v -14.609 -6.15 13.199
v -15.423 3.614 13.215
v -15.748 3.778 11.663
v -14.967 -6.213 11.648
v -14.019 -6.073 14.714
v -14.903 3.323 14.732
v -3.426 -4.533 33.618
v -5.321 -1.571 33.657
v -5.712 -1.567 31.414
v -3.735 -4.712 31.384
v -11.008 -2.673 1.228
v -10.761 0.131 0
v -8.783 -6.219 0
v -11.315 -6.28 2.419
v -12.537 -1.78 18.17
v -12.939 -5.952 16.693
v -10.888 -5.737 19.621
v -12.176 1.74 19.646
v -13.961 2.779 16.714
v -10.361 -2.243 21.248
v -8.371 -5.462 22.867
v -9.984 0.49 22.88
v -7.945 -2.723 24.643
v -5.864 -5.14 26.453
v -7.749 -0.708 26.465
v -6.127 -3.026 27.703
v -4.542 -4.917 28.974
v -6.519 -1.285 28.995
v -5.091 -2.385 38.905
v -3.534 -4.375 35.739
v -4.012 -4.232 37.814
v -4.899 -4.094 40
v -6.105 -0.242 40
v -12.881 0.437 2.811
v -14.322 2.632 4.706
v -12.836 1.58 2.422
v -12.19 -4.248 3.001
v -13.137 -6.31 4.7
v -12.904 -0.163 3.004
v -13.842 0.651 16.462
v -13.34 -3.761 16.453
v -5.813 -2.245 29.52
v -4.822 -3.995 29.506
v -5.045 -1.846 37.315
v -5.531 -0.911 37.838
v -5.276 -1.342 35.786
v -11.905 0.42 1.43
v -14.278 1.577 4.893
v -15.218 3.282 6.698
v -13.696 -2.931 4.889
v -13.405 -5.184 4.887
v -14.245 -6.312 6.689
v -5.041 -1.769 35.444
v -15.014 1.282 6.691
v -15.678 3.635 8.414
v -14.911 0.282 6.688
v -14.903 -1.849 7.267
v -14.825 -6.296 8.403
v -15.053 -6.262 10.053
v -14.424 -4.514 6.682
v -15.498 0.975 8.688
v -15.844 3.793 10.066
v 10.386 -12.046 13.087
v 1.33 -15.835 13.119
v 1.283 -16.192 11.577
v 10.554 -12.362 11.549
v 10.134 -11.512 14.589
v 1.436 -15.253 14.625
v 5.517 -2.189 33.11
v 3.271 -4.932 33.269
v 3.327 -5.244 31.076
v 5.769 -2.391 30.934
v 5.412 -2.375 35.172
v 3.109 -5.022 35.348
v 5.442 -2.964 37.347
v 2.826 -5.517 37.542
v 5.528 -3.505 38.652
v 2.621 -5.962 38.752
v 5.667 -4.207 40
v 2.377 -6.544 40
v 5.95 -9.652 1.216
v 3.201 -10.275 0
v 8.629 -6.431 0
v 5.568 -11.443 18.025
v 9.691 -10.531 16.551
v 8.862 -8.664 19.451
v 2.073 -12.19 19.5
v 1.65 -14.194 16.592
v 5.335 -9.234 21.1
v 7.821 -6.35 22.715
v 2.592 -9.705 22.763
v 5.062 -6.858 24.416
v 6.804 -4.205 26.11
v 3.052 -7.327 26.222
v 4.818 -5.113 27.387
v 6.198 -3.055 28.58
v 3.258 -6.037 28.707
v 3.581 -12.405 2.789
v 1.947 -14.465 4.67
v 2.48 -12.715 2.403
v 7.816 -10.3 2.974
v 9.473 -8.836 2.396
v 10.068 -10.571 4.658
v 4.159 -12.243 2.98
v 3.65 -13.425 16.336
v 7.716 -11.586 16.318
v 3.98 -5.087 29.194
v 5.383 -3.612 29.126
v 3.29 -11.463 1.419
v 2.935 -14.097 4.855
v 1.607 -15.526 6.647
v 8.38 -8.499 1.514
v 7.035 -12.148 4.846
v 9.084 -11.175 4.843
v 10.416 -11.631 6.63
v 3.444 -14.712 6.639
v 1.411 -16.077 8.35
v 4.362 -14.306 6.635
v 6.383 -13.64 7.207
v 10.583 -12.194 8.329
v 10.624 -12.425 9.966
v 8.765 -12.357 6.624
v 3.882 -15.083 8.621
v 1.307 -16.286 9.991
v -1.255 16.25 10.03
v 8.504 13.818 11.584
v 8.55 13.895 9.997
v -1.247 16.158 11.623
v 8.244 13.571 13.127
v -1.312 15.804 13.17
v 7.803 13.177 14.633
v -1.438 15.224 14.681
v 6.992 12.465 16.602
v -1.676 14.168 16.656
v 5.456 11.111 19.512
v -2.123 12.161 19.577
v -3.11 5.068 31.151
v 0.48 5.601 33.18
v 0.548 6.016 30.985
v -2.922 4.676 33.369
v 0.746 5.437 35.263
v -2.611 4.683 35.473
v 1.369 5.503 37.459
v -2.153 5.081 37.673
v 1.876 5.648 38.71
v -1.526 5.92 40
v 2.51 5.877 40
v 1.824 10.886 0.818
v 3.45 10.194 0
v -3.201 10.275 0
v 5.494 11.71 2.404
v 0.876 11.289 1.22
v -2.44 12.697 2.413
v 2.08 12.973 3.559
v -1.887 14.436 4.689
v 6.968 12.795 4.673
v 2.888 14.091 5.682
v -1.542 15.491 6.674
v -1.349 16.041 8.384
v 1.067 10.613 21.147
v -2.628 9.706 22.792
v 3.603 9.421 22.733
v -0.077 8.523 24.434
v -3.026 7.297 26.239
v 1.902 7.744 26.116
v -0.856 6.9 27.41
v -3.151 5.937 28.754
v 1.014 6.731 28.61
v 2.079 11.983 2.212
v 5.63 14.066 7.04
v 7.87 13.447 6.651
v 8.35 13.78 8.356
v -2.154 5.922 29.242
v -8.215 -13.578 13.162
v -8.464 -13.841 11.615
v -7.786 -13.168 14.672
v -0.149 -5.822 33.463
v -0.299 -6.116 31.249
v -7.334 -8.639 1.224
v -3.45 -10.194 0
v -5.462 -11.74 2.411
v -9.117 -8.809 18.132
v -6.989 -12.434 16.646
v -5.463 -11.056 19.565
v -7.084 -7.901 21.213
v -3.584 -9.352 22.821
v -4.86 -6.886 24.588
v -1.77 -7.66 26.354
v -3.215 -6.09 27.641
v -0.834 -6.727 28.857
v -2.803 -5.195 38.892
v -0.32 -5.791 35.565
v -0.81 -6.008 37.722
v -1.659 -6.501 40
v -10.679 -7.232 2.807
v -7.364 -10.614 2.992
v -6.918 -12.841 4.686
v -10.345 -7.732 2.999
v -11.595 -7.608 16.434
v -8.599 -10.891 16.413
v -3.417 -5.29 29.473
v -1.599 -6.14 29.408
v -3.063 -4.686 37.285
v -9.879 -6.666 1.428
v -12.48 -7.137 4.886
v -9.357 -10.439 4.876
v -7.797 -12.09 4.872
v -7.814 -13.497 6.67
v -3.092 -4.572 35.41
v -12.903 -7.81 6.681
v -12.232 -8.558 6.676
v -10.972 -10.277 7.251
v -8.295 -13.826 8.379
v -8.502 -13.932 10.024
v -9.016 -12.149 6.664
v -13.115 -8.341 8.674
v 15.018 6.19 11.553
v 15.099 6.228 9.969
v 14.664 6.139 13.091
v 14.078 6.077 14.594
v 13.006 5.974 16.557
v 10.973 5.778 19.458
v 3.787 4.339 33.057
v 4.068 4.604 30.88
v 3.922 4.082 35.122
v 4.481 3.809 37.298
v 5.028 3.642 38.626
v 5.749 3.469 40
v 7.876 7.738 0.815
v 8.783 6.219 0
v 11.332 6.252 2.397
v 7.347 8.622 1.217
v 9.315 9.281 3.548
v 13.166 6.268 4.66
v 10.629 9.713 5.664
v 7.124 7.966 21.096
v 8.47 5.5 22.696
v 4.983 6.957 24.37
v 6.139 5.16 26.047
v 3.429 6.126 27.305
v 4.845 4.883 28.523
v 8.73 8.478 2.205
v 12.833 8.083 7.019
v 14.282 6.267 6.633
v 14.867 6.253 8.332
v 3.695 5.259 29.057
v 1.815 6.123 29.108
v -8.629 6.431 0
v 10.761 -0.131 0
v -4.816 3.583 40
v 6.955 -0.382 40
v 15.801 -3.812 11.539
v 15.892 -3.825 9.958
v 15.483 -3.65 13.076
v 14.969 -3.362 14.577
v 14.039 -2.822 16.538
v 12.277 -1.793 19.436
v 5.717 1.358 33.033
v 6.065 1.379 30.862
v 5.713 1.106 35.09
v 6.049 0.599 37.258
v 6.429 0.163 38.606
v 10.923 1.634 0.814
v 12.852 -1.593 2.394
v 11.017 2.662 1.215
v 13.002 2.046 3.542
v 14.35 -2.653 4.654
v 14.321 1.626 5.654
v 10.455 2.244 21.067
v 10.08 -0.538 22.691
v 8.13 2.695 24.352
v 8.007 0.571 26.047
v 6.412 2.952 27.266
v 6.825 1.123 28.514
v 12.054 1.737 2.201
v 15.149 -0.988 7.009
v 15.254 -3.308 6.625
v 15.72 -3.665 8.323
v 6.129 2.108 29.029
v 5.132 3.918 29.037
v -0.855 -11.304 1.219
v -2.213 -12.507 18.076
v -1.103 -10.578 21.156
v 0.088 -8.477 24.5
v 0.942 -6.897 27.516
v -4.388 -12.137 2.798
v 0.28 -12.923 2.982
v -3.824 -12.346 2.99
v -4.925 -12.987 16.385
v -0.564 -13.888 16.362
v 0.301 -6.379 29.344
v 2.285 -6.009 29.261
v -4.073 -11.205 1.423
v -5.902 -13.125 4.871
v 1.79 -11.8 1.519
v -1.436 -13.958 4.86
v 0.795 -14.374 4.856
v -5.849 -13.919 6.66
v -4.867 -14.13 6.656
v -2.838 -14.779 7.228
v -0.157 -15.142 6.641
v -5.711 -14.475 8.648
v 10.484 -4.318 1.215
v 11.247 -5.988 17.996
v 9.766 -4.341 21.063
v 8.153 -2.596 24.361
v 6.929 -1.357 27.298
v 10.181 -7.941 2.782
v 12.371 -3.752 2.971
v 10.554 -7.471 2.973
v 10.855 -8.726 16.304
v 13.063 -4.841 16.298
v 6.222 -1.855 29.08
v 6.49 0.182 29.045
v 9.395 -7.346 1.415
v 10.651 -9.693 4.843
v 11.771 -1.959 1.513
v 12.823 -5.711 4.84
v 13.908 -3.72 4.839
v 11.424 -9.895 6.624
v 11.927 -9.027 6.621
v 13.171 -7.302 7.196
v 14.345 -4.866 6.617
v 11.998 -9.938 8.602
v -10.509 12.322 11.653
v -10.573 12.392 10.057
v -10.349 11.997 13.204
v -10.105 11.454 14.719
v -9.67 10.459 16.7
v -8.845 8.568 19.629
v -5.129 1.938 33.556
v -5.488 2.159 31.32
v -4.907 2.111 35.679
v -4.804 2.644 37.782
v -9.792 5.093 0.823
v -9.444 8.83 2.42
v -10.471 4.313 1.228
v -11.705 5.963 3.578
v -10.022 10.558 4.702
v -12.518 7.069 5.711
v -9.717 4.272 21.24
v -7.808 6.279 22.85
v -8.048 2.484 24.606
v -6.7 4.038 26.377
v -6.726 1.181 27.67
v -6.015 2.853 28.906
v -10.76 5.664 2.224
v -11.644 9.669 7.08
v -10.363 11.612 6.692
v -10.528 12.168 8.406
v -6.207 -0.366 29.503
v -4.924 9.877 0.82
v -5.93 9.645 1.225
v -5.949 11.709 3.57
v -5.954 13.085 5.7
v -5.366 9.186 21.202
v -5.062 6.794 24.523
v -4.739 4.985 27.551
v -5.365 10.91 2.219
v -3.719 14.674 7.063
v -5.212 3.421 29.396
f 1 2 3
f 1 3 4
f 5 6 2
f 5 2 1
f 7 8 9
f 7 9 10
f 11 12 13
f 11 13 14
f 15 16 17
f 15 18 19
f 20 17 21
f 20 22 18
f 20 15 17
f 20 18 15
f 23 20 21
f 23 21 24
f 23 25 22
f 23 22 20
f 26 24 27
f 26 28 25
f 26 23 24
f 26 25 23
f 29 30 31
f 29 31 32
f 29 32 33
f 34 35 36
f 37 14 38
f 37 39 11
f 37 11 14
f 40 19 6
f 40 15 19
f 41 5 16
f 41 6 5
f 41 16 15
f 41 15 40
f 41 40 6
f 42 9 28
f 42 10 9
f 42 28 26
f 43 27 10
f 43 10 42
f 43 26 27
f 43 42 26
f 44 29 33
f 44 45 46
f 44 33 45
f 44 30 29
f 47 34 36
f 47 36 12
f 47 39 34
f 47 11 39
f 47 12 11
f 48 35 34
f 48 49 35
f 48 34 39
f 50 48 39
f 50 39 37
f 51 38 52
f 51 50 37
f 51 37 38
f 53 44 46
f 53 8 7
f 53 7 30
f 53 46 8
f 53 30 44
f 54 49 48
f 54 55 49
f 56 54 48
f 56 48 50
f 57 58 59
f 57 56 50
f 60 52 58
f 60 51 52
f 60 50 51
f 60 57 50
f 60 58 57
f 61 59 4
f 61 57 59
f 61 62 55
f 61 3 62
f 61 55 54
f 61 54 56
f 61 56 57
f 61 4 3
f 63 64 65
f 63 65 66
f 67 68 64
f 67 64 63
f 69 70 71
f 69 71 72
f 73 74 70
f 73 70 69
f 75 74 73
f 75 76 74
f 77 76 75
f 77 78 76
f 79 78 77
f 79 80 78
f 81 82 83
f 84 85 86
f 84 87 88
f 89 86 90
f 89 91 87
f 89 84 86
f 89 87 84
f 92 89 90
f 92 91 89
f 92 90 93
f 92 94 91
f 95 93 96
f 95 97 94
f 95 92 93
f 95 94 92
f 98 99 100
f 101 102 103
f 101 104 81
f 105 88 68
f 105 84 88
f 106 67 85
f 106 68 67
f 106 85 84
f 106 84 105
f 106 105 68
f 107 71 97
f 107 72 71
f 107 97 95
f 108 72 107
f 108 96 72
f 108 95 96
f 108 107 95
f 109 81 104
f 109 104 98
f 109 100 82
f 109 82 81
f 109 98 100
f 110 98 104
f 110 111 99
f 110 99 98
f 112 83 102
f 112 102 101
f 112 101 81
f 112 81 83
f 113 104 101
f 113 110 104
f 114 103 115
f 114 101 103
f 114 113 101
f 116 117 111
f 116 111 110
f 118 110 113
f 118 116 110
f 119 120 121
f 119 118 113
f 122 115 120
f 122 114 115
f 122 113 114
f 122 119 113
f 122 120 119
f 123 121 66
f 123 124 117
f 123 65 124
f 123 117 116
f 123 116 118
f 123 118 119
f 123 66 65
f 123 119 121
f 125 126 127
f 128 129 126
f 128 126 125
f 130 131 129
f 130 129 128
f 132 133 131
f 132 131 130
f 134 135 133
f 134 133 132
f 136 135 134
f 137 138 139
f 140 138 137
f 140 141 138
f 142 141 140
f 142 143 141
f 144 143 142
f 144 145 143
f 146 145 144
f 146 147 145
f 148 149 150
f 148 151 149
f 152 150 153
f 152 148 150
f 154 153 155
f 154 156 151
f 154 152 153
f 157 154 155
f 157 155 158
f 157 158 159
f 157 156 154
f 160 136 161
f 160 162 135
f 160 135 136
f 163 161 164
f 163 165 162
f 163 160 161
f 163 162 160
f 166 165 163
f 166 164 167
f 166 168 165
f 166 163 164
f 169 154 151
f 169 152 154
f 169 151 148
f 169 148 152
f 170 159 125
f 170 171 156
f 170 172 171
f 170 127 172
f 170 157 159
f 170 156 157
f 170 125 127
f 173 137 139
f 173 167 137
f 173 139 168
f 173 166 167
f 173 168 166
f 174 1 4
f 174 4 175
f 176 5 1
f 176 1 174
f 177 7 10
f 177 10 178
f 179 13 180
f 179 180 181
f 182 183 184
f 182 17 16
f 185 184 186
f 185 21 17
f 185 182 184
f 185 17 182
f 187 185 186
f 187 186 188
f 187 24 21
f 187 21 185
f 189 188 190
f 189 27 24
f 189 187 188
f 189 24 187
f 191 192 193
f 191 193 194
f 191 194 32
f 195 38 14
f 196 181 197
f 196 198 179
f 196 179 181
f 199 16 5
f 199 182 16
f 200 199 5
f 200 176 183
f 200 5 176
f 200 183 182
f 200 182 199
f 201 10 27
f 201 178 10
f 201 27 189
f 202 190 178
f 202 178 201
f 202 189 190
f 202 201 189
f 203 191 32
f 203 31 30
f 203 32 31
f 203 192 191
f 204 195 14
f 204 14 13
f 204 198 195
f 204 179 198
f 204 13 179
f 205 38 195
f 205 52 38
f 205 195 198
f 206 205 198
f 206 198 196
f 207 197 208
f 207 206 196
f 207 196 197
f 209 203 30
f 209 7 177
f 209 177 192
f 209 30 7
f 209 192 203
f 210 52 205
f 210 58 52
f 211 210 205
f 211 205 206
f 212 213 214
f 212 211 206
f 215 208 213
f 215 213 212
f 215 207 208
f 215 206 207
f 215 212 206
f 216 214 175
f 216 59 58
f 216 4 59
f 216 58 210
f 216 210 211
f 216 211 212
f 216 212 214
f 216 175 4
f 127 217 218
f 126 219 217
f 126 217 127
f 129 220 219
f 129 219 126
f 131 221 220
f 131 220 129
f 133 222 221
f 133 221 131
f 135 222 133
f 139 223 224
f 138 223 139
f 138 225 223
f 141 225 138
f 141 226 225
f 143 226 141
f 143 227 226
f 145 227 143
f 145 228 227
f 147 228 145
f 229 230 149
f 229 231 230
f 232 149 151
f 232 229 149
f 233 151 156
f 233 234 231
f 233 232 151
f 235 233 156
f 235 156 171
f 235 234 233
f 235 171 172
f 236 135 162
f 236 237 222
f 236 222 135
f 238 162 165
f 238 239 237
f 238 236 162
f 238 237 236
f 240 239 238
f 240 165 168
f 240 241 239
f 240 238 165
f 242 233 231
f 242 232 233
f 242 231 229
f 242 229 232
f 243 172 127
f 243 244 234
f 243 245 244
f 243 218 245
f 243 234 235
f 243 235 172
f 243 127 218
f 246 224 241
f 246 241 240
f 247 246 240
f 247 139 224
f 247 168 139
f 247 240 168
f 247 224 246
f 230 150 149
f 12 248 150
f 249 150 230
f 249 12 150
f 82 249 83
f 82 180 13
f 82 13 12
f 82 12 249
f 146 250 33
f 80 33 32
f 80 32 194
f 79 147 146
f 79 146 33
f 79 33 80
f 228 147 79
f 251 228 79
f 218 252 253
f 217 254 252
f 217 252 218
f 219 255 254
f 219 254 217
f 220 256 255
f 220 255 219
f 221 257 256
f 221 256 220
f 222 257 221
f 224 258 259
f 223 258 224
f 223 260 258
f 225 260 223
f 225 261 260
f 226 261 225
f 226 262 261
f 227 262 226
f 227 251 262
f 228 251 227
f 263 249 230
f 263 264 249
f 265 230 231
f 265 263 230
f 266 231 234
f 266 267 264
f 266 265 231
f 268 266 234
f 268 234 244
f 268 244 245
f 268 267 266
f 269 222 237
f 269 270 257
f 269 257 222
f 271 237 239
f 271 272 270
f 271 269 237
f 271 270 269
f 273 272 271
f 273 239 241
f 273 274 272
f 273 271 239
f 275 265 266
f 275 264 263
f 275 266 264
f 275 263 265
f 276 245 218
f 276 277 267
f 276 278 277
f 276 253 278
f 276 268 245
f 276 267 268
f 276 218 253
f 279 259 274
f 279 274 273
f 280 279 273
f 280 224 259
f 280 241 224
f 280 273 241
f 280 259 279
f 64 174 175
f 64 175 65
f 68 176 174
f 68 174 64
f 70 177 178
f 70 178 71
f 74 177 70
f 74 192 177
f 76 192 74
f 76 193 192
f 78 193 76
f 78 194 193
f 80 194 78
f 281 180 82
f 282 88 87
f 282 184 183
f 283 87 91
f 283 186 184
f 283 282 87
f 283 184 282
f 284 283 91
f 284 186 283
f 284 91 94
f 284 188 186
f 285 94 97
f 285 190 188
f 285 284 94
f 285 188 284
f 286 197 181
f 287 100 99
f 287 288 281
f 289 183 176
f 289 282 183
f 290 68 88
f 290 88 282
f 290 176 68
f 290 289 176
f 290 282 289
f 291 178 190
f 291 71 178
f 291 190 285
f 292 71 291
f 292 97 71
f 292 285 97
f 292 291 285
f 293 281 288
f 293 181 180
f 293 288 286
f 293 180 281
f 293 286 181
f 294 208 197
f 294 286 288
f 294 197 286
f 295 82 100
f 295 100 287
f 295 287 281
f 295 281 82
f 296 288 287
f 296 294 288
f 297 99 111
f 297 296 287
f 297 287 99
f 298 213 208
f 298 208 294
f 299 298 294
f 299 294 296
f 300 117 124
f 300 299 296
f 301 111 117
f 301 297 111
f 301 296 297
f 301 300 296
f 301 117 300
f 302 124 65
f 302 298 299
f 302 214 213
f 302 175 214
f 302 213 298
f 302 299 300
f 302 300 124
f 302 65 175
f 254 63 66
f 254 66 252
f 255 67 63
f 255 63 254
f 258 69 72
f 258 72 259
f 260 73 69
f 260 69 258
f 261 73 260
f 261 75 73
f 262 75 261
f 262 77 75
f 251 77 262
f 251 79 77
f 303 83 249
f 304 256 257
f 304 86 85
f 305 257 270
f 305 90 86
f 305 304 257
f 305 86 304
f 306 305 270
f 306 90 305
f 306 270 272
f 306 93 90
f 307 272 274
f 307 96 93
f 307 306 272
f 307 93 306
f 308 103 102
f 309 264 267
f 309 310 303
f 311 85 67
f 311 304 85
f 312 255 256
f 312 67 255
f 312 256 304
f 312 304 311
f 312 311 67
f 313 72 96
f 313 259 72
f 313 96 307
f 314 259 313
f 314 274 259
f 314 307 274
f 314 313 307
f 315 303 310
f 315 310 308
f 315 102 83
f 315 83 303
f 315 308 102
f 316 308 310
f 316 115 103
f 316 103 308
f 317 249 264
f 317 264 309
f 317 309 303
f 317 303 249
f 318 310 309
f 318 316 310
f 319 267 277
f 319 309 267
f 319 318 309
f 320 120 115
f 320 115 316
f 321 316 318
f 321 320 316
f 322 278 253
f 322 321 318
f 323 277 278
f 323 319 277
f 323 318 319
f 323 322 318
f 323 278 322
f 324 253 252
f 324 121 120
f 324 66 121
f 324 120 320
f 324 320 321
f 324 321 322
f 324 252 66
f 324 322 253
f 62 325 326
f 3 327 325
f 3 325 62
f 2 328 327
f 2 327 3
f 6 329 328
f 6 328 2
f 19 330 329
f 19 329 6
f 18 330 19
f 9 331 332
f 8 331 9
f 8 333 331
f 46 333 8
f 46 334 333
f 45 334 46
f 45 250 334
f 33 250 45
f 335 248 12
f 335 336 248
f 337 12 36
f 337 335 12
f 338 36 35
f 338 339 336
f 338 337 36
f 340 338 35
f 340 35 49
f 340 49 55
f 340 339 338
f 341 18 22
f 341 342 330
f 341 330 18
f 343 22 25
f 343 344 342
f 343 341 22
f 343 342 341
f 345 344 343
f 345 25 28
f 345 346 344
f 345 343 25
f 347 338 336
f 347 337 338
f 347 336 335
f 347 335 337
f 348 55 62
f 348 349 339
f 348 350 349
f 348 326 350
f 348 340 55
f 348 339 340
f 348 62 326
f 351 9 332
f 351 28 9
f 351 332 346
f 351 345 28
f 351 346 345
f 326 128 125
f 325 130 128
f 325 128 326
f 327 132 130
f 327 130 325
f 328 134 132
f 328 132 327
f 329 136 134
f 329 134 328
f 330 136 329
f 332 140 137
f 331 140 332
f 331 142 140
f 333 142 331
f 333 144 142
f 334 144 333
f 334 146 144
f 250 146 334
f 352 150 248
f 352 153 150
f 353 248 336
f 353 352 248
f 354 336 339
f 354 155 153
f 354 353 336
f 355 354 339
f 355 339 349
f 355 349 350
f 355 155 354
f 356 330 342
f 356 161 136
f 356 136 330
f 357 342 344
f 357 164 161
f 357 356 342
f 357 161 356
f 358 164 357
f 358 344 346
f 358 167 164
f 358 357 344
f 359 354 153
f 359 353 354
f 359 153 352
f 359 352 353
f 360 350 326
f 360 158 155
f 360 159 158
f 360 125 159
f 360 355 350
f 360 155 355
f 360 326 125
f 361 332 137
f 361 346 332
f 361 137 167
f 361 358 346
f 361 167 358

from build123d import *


with BuildPart() as part:
    # Sketch003 → AdditiveLoft section 0
    with BuildSketch(Plane.XY):
        Polygon((-8.628875, 6.430782), (-10.760825, 0.130686), (-8.782506, -6.219327), (-3.449568, -10.193769), (3.200988, -10.274537), (8.628875, -6.430782), (10.760825, -0.130686), (8.782506, 6.219327), (3.449568, 10.193769), (-3.200988, 10.274537), align=None)
    # Sketch001 → AdditiveLoft section 1
    with BuildSketch(Plane.XY.offset(15)):
        Polygon((13.882604, 6.057266), (7.670891, 13.060421), (-1.470842, 15.074939), (-10.050763, 11.331343), (-14.791634, 3.259559), (-13.882604, -6.057266), (-7.670891, -13.060421), (1.470842, -15.074939), (10.050763, -11.331343), (14.791634, -3.259559), align=None)
    # Sketch002 → AdditiveLoft section 2
    with BuildSketch(Plane.XY.offset(25)):
        Polygon((6.810332, 5.27146), (2.411188, 8.267713), (-2.908948, 8.105981), (-7.117965, 4.84804), (-8.608161, -0.261688), (-6.810332, -5.27146), (-2.411188, -8.267713), (2.908948, -8.105981), (7.117965, -4.84804), (8.608161, 0.261688), align=None)
    # Sketch → AdditiveLoft section 3
    with BuildSketch(Plane.XY.offset(40)):
        Polygon((5.749448, 3.469412), (2.50984, 5.876568), (-1.525949, 5.919804), (-4.816384, 3.582606), (-6.104631, -0.242296), (-4.898624, -4.09392), (-1.659017, -6.501076), (2.376772, -6.544312), (5.667207, -4.207114), (6.955455, -0.382212), align=None)
    loft()


solid = part.part
